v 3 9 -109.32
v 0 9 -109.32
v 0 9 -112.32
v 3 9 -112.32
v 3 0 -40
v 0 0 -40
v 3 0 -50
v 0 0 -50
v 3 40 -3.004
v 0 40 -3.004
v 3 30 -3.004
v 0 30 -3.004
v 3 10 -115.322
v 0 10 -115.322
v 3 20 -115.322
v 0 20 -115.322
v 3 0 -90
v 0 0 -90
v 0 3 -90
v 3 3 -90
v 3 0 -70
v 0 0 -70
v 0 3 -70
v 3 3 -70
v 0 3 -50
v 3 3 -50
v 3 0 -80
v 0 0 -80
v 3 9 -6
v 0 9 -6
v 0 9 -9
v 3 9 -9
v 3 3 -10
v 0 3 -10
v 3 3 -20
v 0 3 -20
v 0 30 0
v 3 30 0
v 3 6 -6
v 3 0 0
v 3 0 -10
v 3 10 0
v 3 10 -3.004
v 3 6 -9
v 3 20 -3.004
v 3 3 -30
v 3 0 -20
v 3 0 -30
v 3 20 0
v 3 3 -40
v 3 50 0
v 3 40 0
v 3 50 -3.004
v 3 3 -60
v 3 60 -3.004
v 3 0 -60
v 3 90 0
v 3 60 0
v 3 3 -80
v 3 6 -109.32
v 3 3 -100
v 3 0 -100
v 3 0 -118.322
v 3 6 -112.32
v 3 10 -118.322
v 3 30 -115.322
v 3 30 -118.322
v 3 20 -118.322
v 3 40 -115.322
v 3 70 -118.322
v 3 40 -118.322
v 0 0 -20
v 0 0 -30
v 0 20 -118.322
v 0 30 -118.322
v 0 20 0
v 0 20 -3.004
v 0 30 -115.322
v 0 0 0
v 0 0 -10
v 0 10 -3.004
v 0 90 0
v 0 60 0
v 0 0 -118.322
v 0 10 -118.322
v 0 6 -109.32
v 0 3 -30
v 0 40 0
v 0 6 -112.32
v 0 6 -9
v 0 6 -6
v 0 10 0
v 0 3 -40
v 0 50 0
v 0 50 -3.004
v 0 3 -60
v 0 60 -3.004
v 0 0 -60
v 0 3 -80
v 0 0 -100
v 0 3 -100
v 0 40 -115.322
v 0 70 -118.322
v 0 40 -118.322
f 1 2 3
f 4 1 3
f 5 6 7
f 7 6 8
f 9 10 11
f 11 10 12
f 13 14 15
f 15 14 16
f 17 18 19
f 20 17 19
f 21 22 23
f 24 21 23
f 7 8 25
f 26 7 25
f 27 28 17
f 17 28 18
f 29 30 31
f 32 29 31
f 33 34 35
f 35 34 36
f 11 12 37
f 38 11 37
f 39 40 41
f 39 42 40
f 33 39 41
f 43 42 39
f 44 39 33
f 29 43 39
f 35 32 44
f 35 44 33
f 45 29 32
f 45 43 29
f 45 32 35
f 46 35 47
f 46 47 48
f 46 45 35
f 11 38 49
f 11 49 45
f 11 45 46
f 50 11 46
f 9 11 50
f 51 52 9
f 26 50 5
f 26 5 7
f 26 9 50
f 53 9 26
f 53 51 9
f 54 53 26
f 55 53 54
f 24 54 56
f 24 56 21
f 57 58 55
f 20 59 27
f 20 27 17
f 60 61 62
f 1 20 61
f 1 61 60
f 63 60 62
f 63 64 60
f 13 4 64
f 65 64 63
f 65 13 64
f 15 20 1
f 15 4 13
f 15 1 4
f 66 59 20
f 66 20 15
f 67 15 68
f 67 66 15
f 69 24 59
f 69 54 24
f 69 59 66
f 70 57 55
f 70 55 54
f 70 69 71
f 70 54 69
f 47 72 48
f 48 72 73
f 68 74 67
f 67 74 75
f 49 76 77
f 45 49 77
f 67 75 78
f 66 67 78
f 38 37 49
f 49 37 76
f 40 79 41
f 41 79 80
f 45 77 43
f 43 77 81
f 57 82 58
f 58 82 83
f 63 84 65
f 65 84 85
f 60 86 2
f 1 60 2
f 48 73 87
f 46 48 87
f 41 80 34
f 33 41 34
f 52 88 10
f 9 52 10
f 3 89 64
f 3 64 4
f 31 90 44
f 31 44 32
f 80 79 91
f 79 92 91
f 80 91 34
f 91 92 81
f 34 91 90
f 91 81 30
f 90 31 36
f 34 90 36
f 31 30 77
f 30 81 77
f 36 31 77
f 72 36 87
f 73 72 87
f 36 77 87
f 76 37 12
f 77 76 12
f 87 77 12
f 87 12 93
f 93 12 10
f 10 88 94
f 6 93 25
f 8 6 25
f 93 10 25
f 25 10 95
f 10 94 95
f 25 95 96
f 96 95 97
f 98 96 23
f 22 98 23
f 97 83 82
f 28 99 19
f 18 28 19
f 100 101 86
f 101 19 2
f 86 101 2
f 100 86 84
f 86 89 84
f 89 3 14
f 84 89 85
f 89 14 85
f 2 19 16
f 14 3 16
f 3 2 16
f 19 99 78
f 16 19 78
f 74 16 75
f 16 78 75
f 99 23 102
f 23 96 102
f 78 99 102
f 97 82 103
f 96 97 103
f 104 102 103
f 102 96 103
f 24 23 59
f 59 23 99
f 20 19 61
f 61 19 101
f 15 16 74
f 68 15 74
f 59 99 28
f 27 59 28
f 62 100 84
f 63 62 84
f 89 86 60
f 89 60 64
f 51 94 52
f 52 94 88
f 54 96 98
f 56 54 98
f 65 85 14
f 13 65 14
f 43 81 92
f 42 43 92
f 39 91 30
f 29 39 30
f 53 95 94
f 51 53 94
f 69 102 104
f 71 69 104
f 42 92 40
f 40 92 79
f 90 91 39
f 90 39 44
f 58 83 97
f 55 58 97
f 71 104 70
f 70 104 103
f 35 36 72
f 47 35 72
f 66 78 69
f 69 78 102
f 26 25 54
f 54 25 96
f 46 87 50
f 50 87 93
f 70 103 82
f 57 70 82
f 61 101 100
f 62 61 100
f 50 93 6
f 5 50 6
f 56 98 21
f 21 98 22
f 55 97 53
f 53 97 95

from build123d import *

# Parameters (mm, degrees)
SKETCH1_W           = 3
SKETCH1_H           = 3
BOSS_EXTRUDE1_DEPTH = 3


with BuildPart() as part:
    # Sketch1 → Boss-Extrude1 (new body)
    with BuildSketch(Plane(origin=(0, 0, 0), x_dir=(0, 0, -1), z_dir=(1, 0, 0))):
        Polygon((0, 0), (10, 0), (10, 3), (20, 3), (20, 0), (30, 0), (30, 3), (40, 3), (40, 0), (50, 0), (50, 3), (60, 3), (60, 0), (70, 0), (70, 3), (80, 3), (80, 0), (90, 0), (90, 3), (100, 3), (100, 0), (118.321595662, 0), (118.321595662, 10), (115.321595662, 10), (115.321595662, 20), (118.321595662, 20), (118.321595662, 30), (115.321595662, 30), (115.321595662, 40), (118.321595662, 40), (118.321595662, 70), (0, 90), (0, 60), (3.003699444, 60), (3.003699444, 50), (0, 50), (0, 40), (3.003699444, 40), (3.003699444, 30), (0, 30), (0, 20), (3.003699444, 20), (3.003699444, 10), (0, 10), align=None)
        with Locations((110.82, 7.5)):
            Rectangle(SKETCH1_W, SKETCH1_H, mode=Mode.SUBTRACT)
        with Locations((7.5, 7.5)):
            Rectangle(SKETCH1_W, SKETCH1_H, mode=Mode.SUBTRACT)
    extrude(amount=BOSS_EXTRUDE1_DEPTH)


solid = part.part
